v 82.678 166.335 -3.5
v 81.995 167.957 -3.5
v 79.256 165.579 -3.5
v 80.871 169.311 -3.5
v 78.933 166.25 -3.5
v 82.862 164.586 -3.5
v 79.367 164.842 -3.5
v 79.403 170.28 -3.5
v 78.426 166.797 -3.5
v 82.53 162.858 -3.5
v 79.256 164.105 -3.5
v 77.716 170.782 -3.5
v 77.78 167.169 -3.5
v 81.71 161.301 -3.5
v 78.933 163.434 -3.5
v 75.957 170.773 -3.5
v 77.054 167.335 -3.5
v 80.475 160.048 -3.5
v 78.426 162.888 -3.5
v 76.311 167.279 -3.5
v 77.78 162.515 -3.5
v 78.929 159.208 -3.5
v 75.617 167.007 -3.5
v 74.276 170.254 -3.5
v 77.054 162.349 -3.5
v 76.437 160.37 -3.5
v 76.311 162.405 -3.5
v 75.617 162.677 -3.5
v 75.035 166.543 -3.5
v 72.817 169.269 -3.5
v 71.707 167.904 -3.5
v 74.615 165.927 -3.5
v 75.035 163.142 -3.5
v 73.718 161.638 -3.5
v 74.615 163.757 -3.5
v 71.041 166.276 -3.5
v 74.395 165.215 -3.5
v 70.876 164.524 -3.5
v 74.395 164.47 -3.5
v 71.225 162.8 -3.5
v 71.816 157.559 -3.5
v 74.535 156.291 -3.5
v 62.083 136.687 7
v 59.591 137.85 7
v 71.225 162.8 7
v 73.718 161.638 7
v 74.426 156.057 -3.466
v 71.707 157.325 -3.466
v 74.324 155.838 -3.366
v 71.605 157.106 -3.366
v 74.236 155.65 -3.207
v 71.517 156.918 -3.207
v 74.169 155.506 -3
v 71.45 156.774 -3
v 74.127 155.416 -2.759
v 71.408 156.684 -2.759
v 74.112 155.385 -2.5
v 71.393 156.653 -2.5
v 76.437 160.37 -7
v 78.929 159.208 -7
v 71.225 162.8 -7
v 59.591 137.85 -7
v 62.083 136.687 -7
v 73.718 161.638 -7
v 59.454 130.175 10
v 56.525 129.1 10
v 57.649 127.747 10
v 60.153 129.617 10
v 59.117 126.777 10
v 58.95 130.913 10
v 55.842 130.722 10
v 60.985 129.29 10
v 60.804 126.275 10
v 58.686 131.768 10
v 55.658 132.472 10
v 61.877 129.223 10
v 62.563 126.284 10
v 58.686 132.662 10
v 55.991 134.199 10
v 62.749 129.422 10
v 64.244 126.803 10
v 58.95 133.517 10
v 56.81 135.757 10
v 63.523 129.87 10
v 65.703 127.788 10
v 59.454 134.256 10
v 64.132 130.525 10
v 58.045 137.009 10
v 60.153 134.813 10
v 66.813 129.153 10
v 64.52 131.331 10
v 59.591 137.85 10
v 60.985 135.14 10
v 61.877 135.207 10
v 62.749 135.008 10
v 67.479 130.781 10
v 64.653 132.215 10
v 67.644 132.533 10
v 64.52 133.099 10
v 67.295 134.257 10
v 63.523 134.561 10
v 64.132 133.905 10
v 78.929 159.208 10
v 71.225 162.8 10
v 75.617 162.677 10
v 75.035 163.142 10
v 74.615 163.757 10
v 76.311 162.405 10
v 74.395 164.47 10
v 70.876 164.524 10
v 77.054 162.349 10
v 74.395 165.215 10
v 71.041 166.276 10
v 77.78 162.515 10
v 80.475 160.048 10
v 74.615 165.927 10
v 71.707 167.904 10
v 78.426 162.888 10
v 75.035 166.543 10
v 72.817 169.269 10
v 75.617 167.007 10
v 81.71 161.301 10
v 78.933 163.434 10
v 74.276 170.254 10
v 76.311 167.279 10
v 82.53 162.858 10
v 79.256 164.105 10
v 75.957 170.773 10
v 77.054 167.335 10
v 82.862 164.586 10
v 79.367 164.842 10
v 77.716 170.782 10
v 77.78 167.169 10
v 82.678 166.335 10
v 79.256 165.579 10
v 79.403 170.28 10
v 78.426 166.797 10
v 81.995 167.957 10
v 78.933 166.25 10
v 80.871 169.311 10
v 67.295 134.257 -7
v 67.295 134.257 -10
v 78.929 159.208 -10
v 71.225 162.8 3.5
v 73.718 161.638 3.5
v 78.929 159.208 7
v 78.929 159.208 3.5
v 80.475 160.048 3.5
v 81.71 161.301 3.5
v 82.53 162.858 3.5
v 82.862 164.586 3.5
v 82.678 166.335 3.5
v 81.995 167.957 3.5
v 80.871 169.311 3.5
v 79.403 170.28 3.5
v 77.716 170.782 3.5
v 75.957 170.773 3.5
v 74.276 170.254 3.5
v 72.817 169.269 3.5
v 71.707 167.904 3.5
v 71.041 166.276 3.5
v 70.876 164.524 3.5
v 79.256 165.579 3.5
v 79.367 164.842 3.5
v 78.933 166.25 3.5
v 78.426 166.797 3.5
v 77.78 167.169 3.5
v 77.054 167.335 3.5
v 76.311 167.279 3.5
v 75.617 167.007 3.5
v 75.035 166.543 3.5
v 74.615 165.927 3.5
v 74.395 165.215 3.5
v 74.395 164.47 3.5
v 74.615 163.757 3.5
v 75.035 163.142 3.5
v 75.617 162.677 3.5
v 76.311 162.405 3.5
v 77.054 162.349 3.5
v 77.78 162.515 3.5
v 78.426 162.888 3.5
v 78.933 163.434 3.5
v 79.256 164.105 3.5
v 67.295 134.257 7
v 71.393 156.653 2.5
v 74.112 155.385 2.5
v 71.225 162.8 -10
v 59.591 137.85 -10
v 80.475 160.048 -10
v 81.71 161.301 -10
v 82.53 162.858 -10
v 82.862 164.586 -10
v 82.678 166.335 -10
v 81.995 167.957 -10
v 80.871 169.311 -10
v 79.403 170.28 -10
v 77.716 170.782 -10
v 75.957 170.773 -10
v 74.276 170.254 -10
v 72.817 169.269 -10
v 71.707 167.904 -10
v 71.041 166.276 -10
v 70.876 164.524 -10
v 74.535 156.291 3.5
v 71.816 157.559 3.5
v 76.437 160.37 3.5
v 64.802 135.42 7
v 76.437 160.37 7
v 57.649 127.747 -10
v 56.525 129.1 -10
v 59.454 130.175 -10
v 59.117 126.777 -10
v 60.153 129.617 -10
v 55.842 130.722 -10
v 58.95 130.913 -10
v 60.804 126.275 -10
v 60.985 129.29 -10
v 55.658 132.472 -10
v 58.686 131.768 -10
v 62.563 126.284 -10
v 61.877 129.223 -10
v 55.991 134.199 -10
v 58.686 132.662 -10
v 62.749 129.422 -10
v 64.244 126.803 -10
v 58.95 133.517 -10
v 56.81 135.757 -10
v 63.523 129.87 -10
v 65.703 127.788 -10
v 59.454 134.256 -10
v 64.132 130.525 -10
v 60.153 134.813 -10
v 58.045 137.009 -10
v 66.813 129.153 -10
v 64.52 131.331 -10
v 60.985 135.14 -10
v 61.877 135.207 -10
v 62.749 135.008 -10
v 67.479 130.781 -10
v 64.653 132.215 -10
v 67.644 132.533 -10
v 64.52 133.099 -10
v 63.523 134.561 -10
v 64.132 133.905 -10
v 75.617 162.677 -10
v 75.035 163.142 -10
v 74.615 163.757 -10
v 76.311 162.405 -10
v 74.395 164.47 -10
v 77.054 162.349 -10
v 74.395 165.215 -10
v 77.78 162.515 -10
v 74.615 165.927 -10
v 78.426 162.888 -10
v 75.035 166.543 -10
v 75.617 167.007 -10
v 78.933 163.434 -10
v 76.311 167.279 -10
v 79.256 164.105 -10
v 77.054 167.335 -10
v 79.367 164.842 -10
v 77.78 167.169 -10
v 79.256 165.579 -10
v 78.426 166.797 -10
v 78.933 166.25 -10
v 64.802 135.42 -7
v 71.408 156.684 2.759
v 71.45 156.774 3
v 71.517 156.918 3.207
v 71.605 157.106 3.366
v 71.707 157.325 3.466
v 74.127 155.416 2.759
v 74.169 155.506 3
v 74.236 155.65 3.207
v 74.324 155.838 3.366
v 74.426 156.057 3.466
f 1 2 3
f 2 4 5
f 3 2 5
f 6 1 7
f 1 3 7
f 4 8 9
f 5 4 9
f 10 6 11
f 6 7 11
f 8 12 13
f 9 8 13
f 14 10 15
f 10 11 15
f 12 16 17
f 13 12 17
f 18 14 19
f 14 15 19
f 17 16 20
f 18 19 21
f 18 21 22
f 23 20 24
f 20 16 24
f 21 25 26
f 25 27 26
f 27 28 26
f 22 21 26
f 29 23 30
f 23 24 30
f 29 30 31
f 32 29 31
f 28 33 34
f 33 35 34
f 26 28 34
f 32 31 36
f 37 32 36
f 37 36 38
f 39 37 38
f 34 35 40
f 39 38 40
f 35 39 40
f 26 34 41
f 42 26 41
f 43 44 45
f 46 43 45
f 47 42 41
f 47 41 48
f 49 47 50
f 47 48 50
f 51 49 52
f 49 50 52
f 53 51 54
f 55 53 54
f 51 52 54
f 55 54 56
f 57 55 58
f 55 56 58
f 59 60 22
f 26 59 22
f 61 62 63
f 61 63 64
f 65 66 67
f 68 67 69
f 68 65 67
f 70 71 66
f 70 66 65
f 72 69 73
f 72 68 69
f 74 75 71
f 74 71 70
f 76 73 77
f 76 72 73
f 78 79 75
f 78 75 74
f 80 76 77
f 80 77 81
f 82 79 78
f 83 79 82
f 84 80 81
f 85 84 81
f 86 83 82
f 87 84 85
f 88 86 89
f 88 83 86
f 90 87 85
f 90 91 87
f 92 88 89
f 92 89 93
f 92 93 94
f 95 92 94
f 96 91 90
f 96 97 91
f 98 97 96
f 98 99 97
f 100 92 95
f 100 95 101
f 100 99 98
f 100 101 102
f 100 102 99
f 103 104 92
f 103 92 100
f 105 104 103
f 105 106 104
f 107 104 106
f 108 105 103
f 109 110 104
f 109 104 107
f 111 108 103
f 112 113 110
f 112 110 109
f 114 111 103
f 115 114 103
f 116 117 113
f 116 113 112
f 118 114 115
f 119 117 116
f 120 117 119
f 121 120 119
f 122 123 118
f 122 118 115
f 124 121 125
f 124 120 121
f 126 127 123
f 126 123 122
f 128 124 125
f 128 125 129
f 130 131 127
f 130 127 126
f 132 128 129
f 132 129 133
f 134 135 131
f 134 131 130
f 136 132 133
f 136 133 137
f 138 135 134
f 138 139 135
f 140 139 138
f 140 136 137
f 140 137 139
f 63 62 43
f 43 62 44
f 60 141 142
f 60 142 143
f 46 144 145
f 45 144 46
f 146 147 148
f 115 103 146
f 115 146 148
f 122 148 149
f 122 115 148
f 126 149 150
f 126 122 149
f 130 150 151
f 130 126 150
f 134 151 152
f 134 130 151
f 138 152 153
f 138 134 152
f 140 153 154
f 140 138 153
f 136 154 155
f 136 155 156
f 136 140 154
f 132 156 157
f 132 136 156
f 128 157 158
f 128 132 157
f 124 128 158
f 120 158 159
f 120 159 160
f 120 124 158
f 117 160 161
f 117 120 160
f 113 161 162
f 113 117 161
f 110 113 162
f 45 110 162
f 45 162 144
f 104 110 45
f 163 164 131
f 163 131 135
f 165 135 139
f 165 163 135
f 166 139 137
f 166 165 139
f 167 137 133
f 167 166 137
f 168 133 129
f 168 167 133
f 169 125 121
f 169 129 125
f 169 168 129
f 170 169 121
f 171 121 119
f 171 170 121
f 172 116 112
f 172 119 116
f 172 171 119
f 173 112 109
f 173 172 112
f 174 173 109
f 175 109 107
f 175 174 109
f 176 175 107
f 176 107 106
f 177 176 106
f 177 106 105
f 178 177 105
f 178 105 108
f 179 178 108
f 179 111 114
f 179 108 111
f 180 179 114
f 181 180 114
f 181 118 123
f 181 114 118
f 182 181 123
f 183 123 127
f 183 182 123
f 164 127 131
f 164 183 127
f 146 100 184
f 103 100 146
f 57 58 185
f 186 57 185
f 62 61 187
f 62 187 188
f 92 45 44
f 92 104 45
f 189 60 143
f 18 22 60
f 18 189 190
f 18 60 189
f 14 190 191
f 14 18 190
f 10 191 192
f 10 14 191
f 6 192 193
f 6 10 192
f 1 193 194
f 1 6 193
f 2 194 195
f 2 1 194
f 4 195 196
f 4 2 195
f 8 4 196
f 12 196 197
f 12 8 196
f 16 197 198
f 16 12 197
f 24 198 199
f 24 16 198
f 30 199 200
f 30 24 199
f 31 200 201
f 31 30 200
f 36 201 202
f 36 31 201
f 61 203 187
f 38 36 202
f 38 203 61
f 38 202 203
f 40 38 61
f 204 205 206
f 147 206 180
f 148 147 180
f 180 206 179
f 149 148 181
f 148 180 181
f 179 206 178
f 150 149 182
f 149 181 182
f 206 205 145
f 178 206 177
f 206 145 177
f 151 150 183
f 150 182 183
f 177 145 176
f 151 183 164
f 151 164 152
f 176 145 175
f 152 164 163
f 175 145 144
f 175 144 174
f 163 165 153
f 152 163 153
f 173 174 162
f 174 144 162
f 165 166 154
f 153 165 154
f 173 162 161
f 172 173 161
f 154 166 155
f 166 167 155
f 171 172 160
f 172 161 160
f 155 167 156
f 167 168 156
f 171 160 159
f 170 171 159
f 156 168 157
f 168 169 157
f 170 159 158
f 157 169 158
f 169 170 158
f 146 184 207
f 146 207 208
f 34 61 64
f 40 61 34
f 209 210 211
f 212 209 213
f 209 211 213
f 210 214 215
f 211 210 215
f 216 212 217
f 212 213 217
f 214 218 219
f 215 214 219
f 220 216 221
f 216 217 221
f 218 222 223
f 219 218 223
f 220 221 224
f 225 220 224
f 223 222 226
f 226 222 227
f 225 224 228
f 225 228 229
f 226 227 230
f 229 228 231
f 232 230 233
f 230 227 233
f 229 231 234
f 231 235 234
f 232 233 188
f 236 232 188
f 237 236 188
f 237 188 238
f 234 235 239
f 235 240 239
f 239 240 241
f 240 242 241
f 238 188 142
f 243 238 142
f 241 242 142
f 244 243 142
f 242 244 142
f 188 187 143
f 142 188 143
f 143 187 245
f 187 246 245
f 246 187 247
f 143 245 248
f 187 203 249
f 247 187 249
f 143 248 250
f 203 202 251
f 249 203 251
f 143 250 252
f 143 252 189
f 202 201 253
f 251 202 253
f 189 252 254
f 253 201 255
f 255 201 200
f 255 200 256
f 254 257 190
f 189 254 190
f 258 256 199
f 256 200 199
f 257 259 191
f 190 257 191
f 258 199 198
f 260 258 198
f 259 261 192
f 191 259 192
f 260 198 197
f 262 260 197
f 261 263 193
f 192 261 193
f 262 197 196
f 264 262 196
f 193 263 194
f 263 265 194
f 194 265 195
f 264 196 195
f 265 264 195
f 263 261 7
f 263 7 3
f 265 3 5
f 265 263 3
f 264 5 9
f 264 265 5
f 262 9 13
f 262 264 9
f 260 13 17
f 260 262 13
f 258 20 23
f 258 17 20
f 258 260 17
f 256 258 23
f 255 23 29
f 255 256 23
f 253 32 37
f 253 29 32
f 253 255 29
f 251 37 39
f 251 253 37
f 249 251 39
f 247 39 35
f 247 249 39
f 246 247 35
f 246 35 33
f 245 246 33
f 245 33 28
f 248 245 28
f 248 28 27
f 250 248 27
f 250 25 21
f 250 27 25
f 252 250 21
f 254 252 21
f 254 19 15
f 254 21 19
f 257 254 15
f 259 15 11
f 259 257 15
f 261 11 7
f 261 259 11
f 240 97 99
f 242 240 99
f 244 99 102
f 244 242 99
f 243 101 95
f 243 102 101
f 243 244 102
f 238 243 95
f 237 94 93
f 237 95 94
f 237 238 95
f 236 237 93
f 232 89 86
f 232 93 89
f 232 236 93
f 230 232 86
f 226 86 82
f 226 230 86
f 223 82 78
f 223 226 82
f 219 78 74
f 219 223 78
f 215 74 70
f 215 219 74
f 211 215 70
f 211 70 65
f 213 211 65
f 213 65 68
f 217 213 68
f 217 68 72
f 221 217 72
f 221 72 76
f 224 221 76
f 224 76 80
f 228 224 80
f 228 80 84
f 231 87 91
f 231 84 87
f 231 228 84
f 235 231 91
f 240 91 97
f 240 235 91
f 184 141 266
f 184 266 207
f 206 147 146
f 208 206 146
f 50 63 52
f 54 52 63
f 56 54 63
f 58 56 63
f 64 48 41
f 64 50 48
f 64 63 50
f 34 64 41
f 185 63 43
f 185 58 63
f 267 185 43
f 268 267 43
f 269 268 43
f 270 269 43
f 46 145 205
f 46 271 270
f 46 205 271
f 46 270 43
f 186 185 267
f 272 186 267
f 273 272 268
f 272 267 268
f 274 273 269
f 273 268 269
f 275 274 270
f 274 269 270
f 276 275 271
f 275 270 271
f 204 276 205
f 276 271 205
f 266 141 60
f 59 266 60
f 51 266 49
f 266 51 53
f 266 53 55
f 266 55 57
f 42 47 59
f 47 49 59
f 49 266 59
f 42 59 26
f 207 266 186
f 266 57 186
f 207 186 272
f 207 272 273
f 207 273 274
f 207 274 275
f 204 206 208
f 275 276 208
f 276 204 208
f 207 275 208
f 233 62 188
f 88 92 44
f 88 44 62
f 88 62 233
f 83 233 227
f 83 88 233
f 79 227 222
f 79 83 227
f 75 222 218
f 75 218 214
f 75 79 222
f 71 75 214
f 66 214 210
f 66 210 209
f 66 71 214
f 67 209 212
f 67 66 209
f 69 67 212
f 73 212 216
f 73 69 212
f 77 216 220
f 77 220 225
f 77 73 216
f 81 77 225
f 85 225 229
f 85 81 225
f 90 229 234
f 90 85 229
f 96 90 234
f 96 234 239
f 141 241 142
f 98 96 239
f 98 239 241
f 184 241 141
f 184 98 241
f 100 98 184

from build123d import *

# Parameters (mm, degrees)
BOSS_EXTRUDE1_DEPTH     = 100
CUT_EXTRUDE1_DEPTH      = 452.895569028
CUT_EXTRUDE1_DEPTH_BACK = 452.895569028
SKETCH2_R               = 30
SKETCH2_R_2             = 25
SKETCH9_R               = 60
CUT_EXTRUDE4_DEPTH      = 35
CUT_EXTRUDE5_DEPTH      = 457.59902747
SKETCH12_W              = 140
SKETCH12_H              = 275.29462827
CUT_EXTRUDE6_DEPTH      = 27.5
SCALE1_SCALE            = 0.1


with BuildPart() as part:
    # Sketch1 → Boss-Extrude1 (new, symmetric)
    with BuildSketch(Plane.XY):
        with BuildLine():
            Line((56.417099429, 20.423292878), (172.761636695, 269.924958208))
            ThreePointArc((172.761636695, 269.924958208), (177.499669931, 380.649270555), (95.725474797, 305.847510456))
            Line((95.725474797, 305.847510456), (-20.619062469, 56.345845126))
            ThreePointArc((-20.619062469, 56.345845126), (-25.357095704, -54.378467222), (56.417099429, 20.423292878))
        make_face()
    extrude(amount=BOSS_EXTRUDE1_DEPTH, both=True)

    # Sketch2 → Cut-Extrude1 (cut, two sides: drawn at the far end of the back side and taken through both)
    with BuildSketch(Plane.XY.offset(-CUT_EXTRUDE1_DEPTH_BACK)):
        Circle(SKETCH2_R)
        with Locations((152.142574227, 326.270803333)):
            Circle(SKETCH2_R_2)
    extrude(amount=CUT_EXTRUDE1_DEPTH + CUT_EXTRUDE1_DEPTH_BACK, mode=Mode.SUBTRACT)

    # Sketch9 → Cut-Extrude4 (cut, symmetric)
    with BuildSketch(Plane.XY):
        with Locations((152.142574227, 326.270803333)):
            Circle(SKETCH9_R)
    extrude(amount=CUT_EXTRUDE4_DEPTH, both=True, mode=Mode.SUBTRACT)

    # Sketch10 → Cut-Extrude5 (cut, through all)
    with BuildSketch(Plane(origin=(-38.518080949, 17.961276124, 0), x_dir=(0, 0, 1), z_dir=(-0.906307787036651, 0.42261826174069733, 0))):
        with BuildLine():
            Line((-35, 317.647314135), (-35, 272.647314135))
            ThreePointArc((-35, 272.647314135), (-32.071067812, 265.576246323), (-25, 262.647314135))
            Line((-25, 262.647314135), (0, 262.647314135))
            Line((0, 262.647314135), (25, 262.647314135))
            ThreePointArc((25, 262.647314135), (32.071067812, 265.576246323), (35, 272.647314135))
            Line((35, 272.647314135), (35, 317.647314135))
            Line((35, 317.647314135), (-35, 317.647314135))
        make_face()
    extrude(amount=-CUT_EXTRUDE5_DEPTH, mode=Mode.SUBTRACT)

    # Sketch12 → Cut-Extrude6 (cut)
    with BuildSketch(Plane(origin=(-38.518080949, 17.961276124, 0), x_dir=(0, 0, 1), z_dir=(-0.906307787036651, 0.42261826174069733, 0))):
        with Locations((0, 180)):
            Rectangle(SKETCH12_W, SKETCH12_H)
    cut_extrude6 = extrude(amount=-CUT_EXTRUDE6_DEPTH, mode=Mode.SUBTRACT)

    # Mirror1: Cut-Extrude6 across plane
    add(cut_extrude6.mirror(Plane(origin=(0, 0, 0), x_dir=(0, 0, 1), z_dir=(-0.906307787036651, 0.42261826174069733, 0))), mode=Mode.SUBTRACT)


with BuildPart() as part_1:
    # Scale1: scaled about (68.503201219, 146.905589092, 0)
    add(part.part.scale(SCALE1_SCALE).moved(Location((61.652881097, 132.215030183, 0))))


solid = part_1.part
